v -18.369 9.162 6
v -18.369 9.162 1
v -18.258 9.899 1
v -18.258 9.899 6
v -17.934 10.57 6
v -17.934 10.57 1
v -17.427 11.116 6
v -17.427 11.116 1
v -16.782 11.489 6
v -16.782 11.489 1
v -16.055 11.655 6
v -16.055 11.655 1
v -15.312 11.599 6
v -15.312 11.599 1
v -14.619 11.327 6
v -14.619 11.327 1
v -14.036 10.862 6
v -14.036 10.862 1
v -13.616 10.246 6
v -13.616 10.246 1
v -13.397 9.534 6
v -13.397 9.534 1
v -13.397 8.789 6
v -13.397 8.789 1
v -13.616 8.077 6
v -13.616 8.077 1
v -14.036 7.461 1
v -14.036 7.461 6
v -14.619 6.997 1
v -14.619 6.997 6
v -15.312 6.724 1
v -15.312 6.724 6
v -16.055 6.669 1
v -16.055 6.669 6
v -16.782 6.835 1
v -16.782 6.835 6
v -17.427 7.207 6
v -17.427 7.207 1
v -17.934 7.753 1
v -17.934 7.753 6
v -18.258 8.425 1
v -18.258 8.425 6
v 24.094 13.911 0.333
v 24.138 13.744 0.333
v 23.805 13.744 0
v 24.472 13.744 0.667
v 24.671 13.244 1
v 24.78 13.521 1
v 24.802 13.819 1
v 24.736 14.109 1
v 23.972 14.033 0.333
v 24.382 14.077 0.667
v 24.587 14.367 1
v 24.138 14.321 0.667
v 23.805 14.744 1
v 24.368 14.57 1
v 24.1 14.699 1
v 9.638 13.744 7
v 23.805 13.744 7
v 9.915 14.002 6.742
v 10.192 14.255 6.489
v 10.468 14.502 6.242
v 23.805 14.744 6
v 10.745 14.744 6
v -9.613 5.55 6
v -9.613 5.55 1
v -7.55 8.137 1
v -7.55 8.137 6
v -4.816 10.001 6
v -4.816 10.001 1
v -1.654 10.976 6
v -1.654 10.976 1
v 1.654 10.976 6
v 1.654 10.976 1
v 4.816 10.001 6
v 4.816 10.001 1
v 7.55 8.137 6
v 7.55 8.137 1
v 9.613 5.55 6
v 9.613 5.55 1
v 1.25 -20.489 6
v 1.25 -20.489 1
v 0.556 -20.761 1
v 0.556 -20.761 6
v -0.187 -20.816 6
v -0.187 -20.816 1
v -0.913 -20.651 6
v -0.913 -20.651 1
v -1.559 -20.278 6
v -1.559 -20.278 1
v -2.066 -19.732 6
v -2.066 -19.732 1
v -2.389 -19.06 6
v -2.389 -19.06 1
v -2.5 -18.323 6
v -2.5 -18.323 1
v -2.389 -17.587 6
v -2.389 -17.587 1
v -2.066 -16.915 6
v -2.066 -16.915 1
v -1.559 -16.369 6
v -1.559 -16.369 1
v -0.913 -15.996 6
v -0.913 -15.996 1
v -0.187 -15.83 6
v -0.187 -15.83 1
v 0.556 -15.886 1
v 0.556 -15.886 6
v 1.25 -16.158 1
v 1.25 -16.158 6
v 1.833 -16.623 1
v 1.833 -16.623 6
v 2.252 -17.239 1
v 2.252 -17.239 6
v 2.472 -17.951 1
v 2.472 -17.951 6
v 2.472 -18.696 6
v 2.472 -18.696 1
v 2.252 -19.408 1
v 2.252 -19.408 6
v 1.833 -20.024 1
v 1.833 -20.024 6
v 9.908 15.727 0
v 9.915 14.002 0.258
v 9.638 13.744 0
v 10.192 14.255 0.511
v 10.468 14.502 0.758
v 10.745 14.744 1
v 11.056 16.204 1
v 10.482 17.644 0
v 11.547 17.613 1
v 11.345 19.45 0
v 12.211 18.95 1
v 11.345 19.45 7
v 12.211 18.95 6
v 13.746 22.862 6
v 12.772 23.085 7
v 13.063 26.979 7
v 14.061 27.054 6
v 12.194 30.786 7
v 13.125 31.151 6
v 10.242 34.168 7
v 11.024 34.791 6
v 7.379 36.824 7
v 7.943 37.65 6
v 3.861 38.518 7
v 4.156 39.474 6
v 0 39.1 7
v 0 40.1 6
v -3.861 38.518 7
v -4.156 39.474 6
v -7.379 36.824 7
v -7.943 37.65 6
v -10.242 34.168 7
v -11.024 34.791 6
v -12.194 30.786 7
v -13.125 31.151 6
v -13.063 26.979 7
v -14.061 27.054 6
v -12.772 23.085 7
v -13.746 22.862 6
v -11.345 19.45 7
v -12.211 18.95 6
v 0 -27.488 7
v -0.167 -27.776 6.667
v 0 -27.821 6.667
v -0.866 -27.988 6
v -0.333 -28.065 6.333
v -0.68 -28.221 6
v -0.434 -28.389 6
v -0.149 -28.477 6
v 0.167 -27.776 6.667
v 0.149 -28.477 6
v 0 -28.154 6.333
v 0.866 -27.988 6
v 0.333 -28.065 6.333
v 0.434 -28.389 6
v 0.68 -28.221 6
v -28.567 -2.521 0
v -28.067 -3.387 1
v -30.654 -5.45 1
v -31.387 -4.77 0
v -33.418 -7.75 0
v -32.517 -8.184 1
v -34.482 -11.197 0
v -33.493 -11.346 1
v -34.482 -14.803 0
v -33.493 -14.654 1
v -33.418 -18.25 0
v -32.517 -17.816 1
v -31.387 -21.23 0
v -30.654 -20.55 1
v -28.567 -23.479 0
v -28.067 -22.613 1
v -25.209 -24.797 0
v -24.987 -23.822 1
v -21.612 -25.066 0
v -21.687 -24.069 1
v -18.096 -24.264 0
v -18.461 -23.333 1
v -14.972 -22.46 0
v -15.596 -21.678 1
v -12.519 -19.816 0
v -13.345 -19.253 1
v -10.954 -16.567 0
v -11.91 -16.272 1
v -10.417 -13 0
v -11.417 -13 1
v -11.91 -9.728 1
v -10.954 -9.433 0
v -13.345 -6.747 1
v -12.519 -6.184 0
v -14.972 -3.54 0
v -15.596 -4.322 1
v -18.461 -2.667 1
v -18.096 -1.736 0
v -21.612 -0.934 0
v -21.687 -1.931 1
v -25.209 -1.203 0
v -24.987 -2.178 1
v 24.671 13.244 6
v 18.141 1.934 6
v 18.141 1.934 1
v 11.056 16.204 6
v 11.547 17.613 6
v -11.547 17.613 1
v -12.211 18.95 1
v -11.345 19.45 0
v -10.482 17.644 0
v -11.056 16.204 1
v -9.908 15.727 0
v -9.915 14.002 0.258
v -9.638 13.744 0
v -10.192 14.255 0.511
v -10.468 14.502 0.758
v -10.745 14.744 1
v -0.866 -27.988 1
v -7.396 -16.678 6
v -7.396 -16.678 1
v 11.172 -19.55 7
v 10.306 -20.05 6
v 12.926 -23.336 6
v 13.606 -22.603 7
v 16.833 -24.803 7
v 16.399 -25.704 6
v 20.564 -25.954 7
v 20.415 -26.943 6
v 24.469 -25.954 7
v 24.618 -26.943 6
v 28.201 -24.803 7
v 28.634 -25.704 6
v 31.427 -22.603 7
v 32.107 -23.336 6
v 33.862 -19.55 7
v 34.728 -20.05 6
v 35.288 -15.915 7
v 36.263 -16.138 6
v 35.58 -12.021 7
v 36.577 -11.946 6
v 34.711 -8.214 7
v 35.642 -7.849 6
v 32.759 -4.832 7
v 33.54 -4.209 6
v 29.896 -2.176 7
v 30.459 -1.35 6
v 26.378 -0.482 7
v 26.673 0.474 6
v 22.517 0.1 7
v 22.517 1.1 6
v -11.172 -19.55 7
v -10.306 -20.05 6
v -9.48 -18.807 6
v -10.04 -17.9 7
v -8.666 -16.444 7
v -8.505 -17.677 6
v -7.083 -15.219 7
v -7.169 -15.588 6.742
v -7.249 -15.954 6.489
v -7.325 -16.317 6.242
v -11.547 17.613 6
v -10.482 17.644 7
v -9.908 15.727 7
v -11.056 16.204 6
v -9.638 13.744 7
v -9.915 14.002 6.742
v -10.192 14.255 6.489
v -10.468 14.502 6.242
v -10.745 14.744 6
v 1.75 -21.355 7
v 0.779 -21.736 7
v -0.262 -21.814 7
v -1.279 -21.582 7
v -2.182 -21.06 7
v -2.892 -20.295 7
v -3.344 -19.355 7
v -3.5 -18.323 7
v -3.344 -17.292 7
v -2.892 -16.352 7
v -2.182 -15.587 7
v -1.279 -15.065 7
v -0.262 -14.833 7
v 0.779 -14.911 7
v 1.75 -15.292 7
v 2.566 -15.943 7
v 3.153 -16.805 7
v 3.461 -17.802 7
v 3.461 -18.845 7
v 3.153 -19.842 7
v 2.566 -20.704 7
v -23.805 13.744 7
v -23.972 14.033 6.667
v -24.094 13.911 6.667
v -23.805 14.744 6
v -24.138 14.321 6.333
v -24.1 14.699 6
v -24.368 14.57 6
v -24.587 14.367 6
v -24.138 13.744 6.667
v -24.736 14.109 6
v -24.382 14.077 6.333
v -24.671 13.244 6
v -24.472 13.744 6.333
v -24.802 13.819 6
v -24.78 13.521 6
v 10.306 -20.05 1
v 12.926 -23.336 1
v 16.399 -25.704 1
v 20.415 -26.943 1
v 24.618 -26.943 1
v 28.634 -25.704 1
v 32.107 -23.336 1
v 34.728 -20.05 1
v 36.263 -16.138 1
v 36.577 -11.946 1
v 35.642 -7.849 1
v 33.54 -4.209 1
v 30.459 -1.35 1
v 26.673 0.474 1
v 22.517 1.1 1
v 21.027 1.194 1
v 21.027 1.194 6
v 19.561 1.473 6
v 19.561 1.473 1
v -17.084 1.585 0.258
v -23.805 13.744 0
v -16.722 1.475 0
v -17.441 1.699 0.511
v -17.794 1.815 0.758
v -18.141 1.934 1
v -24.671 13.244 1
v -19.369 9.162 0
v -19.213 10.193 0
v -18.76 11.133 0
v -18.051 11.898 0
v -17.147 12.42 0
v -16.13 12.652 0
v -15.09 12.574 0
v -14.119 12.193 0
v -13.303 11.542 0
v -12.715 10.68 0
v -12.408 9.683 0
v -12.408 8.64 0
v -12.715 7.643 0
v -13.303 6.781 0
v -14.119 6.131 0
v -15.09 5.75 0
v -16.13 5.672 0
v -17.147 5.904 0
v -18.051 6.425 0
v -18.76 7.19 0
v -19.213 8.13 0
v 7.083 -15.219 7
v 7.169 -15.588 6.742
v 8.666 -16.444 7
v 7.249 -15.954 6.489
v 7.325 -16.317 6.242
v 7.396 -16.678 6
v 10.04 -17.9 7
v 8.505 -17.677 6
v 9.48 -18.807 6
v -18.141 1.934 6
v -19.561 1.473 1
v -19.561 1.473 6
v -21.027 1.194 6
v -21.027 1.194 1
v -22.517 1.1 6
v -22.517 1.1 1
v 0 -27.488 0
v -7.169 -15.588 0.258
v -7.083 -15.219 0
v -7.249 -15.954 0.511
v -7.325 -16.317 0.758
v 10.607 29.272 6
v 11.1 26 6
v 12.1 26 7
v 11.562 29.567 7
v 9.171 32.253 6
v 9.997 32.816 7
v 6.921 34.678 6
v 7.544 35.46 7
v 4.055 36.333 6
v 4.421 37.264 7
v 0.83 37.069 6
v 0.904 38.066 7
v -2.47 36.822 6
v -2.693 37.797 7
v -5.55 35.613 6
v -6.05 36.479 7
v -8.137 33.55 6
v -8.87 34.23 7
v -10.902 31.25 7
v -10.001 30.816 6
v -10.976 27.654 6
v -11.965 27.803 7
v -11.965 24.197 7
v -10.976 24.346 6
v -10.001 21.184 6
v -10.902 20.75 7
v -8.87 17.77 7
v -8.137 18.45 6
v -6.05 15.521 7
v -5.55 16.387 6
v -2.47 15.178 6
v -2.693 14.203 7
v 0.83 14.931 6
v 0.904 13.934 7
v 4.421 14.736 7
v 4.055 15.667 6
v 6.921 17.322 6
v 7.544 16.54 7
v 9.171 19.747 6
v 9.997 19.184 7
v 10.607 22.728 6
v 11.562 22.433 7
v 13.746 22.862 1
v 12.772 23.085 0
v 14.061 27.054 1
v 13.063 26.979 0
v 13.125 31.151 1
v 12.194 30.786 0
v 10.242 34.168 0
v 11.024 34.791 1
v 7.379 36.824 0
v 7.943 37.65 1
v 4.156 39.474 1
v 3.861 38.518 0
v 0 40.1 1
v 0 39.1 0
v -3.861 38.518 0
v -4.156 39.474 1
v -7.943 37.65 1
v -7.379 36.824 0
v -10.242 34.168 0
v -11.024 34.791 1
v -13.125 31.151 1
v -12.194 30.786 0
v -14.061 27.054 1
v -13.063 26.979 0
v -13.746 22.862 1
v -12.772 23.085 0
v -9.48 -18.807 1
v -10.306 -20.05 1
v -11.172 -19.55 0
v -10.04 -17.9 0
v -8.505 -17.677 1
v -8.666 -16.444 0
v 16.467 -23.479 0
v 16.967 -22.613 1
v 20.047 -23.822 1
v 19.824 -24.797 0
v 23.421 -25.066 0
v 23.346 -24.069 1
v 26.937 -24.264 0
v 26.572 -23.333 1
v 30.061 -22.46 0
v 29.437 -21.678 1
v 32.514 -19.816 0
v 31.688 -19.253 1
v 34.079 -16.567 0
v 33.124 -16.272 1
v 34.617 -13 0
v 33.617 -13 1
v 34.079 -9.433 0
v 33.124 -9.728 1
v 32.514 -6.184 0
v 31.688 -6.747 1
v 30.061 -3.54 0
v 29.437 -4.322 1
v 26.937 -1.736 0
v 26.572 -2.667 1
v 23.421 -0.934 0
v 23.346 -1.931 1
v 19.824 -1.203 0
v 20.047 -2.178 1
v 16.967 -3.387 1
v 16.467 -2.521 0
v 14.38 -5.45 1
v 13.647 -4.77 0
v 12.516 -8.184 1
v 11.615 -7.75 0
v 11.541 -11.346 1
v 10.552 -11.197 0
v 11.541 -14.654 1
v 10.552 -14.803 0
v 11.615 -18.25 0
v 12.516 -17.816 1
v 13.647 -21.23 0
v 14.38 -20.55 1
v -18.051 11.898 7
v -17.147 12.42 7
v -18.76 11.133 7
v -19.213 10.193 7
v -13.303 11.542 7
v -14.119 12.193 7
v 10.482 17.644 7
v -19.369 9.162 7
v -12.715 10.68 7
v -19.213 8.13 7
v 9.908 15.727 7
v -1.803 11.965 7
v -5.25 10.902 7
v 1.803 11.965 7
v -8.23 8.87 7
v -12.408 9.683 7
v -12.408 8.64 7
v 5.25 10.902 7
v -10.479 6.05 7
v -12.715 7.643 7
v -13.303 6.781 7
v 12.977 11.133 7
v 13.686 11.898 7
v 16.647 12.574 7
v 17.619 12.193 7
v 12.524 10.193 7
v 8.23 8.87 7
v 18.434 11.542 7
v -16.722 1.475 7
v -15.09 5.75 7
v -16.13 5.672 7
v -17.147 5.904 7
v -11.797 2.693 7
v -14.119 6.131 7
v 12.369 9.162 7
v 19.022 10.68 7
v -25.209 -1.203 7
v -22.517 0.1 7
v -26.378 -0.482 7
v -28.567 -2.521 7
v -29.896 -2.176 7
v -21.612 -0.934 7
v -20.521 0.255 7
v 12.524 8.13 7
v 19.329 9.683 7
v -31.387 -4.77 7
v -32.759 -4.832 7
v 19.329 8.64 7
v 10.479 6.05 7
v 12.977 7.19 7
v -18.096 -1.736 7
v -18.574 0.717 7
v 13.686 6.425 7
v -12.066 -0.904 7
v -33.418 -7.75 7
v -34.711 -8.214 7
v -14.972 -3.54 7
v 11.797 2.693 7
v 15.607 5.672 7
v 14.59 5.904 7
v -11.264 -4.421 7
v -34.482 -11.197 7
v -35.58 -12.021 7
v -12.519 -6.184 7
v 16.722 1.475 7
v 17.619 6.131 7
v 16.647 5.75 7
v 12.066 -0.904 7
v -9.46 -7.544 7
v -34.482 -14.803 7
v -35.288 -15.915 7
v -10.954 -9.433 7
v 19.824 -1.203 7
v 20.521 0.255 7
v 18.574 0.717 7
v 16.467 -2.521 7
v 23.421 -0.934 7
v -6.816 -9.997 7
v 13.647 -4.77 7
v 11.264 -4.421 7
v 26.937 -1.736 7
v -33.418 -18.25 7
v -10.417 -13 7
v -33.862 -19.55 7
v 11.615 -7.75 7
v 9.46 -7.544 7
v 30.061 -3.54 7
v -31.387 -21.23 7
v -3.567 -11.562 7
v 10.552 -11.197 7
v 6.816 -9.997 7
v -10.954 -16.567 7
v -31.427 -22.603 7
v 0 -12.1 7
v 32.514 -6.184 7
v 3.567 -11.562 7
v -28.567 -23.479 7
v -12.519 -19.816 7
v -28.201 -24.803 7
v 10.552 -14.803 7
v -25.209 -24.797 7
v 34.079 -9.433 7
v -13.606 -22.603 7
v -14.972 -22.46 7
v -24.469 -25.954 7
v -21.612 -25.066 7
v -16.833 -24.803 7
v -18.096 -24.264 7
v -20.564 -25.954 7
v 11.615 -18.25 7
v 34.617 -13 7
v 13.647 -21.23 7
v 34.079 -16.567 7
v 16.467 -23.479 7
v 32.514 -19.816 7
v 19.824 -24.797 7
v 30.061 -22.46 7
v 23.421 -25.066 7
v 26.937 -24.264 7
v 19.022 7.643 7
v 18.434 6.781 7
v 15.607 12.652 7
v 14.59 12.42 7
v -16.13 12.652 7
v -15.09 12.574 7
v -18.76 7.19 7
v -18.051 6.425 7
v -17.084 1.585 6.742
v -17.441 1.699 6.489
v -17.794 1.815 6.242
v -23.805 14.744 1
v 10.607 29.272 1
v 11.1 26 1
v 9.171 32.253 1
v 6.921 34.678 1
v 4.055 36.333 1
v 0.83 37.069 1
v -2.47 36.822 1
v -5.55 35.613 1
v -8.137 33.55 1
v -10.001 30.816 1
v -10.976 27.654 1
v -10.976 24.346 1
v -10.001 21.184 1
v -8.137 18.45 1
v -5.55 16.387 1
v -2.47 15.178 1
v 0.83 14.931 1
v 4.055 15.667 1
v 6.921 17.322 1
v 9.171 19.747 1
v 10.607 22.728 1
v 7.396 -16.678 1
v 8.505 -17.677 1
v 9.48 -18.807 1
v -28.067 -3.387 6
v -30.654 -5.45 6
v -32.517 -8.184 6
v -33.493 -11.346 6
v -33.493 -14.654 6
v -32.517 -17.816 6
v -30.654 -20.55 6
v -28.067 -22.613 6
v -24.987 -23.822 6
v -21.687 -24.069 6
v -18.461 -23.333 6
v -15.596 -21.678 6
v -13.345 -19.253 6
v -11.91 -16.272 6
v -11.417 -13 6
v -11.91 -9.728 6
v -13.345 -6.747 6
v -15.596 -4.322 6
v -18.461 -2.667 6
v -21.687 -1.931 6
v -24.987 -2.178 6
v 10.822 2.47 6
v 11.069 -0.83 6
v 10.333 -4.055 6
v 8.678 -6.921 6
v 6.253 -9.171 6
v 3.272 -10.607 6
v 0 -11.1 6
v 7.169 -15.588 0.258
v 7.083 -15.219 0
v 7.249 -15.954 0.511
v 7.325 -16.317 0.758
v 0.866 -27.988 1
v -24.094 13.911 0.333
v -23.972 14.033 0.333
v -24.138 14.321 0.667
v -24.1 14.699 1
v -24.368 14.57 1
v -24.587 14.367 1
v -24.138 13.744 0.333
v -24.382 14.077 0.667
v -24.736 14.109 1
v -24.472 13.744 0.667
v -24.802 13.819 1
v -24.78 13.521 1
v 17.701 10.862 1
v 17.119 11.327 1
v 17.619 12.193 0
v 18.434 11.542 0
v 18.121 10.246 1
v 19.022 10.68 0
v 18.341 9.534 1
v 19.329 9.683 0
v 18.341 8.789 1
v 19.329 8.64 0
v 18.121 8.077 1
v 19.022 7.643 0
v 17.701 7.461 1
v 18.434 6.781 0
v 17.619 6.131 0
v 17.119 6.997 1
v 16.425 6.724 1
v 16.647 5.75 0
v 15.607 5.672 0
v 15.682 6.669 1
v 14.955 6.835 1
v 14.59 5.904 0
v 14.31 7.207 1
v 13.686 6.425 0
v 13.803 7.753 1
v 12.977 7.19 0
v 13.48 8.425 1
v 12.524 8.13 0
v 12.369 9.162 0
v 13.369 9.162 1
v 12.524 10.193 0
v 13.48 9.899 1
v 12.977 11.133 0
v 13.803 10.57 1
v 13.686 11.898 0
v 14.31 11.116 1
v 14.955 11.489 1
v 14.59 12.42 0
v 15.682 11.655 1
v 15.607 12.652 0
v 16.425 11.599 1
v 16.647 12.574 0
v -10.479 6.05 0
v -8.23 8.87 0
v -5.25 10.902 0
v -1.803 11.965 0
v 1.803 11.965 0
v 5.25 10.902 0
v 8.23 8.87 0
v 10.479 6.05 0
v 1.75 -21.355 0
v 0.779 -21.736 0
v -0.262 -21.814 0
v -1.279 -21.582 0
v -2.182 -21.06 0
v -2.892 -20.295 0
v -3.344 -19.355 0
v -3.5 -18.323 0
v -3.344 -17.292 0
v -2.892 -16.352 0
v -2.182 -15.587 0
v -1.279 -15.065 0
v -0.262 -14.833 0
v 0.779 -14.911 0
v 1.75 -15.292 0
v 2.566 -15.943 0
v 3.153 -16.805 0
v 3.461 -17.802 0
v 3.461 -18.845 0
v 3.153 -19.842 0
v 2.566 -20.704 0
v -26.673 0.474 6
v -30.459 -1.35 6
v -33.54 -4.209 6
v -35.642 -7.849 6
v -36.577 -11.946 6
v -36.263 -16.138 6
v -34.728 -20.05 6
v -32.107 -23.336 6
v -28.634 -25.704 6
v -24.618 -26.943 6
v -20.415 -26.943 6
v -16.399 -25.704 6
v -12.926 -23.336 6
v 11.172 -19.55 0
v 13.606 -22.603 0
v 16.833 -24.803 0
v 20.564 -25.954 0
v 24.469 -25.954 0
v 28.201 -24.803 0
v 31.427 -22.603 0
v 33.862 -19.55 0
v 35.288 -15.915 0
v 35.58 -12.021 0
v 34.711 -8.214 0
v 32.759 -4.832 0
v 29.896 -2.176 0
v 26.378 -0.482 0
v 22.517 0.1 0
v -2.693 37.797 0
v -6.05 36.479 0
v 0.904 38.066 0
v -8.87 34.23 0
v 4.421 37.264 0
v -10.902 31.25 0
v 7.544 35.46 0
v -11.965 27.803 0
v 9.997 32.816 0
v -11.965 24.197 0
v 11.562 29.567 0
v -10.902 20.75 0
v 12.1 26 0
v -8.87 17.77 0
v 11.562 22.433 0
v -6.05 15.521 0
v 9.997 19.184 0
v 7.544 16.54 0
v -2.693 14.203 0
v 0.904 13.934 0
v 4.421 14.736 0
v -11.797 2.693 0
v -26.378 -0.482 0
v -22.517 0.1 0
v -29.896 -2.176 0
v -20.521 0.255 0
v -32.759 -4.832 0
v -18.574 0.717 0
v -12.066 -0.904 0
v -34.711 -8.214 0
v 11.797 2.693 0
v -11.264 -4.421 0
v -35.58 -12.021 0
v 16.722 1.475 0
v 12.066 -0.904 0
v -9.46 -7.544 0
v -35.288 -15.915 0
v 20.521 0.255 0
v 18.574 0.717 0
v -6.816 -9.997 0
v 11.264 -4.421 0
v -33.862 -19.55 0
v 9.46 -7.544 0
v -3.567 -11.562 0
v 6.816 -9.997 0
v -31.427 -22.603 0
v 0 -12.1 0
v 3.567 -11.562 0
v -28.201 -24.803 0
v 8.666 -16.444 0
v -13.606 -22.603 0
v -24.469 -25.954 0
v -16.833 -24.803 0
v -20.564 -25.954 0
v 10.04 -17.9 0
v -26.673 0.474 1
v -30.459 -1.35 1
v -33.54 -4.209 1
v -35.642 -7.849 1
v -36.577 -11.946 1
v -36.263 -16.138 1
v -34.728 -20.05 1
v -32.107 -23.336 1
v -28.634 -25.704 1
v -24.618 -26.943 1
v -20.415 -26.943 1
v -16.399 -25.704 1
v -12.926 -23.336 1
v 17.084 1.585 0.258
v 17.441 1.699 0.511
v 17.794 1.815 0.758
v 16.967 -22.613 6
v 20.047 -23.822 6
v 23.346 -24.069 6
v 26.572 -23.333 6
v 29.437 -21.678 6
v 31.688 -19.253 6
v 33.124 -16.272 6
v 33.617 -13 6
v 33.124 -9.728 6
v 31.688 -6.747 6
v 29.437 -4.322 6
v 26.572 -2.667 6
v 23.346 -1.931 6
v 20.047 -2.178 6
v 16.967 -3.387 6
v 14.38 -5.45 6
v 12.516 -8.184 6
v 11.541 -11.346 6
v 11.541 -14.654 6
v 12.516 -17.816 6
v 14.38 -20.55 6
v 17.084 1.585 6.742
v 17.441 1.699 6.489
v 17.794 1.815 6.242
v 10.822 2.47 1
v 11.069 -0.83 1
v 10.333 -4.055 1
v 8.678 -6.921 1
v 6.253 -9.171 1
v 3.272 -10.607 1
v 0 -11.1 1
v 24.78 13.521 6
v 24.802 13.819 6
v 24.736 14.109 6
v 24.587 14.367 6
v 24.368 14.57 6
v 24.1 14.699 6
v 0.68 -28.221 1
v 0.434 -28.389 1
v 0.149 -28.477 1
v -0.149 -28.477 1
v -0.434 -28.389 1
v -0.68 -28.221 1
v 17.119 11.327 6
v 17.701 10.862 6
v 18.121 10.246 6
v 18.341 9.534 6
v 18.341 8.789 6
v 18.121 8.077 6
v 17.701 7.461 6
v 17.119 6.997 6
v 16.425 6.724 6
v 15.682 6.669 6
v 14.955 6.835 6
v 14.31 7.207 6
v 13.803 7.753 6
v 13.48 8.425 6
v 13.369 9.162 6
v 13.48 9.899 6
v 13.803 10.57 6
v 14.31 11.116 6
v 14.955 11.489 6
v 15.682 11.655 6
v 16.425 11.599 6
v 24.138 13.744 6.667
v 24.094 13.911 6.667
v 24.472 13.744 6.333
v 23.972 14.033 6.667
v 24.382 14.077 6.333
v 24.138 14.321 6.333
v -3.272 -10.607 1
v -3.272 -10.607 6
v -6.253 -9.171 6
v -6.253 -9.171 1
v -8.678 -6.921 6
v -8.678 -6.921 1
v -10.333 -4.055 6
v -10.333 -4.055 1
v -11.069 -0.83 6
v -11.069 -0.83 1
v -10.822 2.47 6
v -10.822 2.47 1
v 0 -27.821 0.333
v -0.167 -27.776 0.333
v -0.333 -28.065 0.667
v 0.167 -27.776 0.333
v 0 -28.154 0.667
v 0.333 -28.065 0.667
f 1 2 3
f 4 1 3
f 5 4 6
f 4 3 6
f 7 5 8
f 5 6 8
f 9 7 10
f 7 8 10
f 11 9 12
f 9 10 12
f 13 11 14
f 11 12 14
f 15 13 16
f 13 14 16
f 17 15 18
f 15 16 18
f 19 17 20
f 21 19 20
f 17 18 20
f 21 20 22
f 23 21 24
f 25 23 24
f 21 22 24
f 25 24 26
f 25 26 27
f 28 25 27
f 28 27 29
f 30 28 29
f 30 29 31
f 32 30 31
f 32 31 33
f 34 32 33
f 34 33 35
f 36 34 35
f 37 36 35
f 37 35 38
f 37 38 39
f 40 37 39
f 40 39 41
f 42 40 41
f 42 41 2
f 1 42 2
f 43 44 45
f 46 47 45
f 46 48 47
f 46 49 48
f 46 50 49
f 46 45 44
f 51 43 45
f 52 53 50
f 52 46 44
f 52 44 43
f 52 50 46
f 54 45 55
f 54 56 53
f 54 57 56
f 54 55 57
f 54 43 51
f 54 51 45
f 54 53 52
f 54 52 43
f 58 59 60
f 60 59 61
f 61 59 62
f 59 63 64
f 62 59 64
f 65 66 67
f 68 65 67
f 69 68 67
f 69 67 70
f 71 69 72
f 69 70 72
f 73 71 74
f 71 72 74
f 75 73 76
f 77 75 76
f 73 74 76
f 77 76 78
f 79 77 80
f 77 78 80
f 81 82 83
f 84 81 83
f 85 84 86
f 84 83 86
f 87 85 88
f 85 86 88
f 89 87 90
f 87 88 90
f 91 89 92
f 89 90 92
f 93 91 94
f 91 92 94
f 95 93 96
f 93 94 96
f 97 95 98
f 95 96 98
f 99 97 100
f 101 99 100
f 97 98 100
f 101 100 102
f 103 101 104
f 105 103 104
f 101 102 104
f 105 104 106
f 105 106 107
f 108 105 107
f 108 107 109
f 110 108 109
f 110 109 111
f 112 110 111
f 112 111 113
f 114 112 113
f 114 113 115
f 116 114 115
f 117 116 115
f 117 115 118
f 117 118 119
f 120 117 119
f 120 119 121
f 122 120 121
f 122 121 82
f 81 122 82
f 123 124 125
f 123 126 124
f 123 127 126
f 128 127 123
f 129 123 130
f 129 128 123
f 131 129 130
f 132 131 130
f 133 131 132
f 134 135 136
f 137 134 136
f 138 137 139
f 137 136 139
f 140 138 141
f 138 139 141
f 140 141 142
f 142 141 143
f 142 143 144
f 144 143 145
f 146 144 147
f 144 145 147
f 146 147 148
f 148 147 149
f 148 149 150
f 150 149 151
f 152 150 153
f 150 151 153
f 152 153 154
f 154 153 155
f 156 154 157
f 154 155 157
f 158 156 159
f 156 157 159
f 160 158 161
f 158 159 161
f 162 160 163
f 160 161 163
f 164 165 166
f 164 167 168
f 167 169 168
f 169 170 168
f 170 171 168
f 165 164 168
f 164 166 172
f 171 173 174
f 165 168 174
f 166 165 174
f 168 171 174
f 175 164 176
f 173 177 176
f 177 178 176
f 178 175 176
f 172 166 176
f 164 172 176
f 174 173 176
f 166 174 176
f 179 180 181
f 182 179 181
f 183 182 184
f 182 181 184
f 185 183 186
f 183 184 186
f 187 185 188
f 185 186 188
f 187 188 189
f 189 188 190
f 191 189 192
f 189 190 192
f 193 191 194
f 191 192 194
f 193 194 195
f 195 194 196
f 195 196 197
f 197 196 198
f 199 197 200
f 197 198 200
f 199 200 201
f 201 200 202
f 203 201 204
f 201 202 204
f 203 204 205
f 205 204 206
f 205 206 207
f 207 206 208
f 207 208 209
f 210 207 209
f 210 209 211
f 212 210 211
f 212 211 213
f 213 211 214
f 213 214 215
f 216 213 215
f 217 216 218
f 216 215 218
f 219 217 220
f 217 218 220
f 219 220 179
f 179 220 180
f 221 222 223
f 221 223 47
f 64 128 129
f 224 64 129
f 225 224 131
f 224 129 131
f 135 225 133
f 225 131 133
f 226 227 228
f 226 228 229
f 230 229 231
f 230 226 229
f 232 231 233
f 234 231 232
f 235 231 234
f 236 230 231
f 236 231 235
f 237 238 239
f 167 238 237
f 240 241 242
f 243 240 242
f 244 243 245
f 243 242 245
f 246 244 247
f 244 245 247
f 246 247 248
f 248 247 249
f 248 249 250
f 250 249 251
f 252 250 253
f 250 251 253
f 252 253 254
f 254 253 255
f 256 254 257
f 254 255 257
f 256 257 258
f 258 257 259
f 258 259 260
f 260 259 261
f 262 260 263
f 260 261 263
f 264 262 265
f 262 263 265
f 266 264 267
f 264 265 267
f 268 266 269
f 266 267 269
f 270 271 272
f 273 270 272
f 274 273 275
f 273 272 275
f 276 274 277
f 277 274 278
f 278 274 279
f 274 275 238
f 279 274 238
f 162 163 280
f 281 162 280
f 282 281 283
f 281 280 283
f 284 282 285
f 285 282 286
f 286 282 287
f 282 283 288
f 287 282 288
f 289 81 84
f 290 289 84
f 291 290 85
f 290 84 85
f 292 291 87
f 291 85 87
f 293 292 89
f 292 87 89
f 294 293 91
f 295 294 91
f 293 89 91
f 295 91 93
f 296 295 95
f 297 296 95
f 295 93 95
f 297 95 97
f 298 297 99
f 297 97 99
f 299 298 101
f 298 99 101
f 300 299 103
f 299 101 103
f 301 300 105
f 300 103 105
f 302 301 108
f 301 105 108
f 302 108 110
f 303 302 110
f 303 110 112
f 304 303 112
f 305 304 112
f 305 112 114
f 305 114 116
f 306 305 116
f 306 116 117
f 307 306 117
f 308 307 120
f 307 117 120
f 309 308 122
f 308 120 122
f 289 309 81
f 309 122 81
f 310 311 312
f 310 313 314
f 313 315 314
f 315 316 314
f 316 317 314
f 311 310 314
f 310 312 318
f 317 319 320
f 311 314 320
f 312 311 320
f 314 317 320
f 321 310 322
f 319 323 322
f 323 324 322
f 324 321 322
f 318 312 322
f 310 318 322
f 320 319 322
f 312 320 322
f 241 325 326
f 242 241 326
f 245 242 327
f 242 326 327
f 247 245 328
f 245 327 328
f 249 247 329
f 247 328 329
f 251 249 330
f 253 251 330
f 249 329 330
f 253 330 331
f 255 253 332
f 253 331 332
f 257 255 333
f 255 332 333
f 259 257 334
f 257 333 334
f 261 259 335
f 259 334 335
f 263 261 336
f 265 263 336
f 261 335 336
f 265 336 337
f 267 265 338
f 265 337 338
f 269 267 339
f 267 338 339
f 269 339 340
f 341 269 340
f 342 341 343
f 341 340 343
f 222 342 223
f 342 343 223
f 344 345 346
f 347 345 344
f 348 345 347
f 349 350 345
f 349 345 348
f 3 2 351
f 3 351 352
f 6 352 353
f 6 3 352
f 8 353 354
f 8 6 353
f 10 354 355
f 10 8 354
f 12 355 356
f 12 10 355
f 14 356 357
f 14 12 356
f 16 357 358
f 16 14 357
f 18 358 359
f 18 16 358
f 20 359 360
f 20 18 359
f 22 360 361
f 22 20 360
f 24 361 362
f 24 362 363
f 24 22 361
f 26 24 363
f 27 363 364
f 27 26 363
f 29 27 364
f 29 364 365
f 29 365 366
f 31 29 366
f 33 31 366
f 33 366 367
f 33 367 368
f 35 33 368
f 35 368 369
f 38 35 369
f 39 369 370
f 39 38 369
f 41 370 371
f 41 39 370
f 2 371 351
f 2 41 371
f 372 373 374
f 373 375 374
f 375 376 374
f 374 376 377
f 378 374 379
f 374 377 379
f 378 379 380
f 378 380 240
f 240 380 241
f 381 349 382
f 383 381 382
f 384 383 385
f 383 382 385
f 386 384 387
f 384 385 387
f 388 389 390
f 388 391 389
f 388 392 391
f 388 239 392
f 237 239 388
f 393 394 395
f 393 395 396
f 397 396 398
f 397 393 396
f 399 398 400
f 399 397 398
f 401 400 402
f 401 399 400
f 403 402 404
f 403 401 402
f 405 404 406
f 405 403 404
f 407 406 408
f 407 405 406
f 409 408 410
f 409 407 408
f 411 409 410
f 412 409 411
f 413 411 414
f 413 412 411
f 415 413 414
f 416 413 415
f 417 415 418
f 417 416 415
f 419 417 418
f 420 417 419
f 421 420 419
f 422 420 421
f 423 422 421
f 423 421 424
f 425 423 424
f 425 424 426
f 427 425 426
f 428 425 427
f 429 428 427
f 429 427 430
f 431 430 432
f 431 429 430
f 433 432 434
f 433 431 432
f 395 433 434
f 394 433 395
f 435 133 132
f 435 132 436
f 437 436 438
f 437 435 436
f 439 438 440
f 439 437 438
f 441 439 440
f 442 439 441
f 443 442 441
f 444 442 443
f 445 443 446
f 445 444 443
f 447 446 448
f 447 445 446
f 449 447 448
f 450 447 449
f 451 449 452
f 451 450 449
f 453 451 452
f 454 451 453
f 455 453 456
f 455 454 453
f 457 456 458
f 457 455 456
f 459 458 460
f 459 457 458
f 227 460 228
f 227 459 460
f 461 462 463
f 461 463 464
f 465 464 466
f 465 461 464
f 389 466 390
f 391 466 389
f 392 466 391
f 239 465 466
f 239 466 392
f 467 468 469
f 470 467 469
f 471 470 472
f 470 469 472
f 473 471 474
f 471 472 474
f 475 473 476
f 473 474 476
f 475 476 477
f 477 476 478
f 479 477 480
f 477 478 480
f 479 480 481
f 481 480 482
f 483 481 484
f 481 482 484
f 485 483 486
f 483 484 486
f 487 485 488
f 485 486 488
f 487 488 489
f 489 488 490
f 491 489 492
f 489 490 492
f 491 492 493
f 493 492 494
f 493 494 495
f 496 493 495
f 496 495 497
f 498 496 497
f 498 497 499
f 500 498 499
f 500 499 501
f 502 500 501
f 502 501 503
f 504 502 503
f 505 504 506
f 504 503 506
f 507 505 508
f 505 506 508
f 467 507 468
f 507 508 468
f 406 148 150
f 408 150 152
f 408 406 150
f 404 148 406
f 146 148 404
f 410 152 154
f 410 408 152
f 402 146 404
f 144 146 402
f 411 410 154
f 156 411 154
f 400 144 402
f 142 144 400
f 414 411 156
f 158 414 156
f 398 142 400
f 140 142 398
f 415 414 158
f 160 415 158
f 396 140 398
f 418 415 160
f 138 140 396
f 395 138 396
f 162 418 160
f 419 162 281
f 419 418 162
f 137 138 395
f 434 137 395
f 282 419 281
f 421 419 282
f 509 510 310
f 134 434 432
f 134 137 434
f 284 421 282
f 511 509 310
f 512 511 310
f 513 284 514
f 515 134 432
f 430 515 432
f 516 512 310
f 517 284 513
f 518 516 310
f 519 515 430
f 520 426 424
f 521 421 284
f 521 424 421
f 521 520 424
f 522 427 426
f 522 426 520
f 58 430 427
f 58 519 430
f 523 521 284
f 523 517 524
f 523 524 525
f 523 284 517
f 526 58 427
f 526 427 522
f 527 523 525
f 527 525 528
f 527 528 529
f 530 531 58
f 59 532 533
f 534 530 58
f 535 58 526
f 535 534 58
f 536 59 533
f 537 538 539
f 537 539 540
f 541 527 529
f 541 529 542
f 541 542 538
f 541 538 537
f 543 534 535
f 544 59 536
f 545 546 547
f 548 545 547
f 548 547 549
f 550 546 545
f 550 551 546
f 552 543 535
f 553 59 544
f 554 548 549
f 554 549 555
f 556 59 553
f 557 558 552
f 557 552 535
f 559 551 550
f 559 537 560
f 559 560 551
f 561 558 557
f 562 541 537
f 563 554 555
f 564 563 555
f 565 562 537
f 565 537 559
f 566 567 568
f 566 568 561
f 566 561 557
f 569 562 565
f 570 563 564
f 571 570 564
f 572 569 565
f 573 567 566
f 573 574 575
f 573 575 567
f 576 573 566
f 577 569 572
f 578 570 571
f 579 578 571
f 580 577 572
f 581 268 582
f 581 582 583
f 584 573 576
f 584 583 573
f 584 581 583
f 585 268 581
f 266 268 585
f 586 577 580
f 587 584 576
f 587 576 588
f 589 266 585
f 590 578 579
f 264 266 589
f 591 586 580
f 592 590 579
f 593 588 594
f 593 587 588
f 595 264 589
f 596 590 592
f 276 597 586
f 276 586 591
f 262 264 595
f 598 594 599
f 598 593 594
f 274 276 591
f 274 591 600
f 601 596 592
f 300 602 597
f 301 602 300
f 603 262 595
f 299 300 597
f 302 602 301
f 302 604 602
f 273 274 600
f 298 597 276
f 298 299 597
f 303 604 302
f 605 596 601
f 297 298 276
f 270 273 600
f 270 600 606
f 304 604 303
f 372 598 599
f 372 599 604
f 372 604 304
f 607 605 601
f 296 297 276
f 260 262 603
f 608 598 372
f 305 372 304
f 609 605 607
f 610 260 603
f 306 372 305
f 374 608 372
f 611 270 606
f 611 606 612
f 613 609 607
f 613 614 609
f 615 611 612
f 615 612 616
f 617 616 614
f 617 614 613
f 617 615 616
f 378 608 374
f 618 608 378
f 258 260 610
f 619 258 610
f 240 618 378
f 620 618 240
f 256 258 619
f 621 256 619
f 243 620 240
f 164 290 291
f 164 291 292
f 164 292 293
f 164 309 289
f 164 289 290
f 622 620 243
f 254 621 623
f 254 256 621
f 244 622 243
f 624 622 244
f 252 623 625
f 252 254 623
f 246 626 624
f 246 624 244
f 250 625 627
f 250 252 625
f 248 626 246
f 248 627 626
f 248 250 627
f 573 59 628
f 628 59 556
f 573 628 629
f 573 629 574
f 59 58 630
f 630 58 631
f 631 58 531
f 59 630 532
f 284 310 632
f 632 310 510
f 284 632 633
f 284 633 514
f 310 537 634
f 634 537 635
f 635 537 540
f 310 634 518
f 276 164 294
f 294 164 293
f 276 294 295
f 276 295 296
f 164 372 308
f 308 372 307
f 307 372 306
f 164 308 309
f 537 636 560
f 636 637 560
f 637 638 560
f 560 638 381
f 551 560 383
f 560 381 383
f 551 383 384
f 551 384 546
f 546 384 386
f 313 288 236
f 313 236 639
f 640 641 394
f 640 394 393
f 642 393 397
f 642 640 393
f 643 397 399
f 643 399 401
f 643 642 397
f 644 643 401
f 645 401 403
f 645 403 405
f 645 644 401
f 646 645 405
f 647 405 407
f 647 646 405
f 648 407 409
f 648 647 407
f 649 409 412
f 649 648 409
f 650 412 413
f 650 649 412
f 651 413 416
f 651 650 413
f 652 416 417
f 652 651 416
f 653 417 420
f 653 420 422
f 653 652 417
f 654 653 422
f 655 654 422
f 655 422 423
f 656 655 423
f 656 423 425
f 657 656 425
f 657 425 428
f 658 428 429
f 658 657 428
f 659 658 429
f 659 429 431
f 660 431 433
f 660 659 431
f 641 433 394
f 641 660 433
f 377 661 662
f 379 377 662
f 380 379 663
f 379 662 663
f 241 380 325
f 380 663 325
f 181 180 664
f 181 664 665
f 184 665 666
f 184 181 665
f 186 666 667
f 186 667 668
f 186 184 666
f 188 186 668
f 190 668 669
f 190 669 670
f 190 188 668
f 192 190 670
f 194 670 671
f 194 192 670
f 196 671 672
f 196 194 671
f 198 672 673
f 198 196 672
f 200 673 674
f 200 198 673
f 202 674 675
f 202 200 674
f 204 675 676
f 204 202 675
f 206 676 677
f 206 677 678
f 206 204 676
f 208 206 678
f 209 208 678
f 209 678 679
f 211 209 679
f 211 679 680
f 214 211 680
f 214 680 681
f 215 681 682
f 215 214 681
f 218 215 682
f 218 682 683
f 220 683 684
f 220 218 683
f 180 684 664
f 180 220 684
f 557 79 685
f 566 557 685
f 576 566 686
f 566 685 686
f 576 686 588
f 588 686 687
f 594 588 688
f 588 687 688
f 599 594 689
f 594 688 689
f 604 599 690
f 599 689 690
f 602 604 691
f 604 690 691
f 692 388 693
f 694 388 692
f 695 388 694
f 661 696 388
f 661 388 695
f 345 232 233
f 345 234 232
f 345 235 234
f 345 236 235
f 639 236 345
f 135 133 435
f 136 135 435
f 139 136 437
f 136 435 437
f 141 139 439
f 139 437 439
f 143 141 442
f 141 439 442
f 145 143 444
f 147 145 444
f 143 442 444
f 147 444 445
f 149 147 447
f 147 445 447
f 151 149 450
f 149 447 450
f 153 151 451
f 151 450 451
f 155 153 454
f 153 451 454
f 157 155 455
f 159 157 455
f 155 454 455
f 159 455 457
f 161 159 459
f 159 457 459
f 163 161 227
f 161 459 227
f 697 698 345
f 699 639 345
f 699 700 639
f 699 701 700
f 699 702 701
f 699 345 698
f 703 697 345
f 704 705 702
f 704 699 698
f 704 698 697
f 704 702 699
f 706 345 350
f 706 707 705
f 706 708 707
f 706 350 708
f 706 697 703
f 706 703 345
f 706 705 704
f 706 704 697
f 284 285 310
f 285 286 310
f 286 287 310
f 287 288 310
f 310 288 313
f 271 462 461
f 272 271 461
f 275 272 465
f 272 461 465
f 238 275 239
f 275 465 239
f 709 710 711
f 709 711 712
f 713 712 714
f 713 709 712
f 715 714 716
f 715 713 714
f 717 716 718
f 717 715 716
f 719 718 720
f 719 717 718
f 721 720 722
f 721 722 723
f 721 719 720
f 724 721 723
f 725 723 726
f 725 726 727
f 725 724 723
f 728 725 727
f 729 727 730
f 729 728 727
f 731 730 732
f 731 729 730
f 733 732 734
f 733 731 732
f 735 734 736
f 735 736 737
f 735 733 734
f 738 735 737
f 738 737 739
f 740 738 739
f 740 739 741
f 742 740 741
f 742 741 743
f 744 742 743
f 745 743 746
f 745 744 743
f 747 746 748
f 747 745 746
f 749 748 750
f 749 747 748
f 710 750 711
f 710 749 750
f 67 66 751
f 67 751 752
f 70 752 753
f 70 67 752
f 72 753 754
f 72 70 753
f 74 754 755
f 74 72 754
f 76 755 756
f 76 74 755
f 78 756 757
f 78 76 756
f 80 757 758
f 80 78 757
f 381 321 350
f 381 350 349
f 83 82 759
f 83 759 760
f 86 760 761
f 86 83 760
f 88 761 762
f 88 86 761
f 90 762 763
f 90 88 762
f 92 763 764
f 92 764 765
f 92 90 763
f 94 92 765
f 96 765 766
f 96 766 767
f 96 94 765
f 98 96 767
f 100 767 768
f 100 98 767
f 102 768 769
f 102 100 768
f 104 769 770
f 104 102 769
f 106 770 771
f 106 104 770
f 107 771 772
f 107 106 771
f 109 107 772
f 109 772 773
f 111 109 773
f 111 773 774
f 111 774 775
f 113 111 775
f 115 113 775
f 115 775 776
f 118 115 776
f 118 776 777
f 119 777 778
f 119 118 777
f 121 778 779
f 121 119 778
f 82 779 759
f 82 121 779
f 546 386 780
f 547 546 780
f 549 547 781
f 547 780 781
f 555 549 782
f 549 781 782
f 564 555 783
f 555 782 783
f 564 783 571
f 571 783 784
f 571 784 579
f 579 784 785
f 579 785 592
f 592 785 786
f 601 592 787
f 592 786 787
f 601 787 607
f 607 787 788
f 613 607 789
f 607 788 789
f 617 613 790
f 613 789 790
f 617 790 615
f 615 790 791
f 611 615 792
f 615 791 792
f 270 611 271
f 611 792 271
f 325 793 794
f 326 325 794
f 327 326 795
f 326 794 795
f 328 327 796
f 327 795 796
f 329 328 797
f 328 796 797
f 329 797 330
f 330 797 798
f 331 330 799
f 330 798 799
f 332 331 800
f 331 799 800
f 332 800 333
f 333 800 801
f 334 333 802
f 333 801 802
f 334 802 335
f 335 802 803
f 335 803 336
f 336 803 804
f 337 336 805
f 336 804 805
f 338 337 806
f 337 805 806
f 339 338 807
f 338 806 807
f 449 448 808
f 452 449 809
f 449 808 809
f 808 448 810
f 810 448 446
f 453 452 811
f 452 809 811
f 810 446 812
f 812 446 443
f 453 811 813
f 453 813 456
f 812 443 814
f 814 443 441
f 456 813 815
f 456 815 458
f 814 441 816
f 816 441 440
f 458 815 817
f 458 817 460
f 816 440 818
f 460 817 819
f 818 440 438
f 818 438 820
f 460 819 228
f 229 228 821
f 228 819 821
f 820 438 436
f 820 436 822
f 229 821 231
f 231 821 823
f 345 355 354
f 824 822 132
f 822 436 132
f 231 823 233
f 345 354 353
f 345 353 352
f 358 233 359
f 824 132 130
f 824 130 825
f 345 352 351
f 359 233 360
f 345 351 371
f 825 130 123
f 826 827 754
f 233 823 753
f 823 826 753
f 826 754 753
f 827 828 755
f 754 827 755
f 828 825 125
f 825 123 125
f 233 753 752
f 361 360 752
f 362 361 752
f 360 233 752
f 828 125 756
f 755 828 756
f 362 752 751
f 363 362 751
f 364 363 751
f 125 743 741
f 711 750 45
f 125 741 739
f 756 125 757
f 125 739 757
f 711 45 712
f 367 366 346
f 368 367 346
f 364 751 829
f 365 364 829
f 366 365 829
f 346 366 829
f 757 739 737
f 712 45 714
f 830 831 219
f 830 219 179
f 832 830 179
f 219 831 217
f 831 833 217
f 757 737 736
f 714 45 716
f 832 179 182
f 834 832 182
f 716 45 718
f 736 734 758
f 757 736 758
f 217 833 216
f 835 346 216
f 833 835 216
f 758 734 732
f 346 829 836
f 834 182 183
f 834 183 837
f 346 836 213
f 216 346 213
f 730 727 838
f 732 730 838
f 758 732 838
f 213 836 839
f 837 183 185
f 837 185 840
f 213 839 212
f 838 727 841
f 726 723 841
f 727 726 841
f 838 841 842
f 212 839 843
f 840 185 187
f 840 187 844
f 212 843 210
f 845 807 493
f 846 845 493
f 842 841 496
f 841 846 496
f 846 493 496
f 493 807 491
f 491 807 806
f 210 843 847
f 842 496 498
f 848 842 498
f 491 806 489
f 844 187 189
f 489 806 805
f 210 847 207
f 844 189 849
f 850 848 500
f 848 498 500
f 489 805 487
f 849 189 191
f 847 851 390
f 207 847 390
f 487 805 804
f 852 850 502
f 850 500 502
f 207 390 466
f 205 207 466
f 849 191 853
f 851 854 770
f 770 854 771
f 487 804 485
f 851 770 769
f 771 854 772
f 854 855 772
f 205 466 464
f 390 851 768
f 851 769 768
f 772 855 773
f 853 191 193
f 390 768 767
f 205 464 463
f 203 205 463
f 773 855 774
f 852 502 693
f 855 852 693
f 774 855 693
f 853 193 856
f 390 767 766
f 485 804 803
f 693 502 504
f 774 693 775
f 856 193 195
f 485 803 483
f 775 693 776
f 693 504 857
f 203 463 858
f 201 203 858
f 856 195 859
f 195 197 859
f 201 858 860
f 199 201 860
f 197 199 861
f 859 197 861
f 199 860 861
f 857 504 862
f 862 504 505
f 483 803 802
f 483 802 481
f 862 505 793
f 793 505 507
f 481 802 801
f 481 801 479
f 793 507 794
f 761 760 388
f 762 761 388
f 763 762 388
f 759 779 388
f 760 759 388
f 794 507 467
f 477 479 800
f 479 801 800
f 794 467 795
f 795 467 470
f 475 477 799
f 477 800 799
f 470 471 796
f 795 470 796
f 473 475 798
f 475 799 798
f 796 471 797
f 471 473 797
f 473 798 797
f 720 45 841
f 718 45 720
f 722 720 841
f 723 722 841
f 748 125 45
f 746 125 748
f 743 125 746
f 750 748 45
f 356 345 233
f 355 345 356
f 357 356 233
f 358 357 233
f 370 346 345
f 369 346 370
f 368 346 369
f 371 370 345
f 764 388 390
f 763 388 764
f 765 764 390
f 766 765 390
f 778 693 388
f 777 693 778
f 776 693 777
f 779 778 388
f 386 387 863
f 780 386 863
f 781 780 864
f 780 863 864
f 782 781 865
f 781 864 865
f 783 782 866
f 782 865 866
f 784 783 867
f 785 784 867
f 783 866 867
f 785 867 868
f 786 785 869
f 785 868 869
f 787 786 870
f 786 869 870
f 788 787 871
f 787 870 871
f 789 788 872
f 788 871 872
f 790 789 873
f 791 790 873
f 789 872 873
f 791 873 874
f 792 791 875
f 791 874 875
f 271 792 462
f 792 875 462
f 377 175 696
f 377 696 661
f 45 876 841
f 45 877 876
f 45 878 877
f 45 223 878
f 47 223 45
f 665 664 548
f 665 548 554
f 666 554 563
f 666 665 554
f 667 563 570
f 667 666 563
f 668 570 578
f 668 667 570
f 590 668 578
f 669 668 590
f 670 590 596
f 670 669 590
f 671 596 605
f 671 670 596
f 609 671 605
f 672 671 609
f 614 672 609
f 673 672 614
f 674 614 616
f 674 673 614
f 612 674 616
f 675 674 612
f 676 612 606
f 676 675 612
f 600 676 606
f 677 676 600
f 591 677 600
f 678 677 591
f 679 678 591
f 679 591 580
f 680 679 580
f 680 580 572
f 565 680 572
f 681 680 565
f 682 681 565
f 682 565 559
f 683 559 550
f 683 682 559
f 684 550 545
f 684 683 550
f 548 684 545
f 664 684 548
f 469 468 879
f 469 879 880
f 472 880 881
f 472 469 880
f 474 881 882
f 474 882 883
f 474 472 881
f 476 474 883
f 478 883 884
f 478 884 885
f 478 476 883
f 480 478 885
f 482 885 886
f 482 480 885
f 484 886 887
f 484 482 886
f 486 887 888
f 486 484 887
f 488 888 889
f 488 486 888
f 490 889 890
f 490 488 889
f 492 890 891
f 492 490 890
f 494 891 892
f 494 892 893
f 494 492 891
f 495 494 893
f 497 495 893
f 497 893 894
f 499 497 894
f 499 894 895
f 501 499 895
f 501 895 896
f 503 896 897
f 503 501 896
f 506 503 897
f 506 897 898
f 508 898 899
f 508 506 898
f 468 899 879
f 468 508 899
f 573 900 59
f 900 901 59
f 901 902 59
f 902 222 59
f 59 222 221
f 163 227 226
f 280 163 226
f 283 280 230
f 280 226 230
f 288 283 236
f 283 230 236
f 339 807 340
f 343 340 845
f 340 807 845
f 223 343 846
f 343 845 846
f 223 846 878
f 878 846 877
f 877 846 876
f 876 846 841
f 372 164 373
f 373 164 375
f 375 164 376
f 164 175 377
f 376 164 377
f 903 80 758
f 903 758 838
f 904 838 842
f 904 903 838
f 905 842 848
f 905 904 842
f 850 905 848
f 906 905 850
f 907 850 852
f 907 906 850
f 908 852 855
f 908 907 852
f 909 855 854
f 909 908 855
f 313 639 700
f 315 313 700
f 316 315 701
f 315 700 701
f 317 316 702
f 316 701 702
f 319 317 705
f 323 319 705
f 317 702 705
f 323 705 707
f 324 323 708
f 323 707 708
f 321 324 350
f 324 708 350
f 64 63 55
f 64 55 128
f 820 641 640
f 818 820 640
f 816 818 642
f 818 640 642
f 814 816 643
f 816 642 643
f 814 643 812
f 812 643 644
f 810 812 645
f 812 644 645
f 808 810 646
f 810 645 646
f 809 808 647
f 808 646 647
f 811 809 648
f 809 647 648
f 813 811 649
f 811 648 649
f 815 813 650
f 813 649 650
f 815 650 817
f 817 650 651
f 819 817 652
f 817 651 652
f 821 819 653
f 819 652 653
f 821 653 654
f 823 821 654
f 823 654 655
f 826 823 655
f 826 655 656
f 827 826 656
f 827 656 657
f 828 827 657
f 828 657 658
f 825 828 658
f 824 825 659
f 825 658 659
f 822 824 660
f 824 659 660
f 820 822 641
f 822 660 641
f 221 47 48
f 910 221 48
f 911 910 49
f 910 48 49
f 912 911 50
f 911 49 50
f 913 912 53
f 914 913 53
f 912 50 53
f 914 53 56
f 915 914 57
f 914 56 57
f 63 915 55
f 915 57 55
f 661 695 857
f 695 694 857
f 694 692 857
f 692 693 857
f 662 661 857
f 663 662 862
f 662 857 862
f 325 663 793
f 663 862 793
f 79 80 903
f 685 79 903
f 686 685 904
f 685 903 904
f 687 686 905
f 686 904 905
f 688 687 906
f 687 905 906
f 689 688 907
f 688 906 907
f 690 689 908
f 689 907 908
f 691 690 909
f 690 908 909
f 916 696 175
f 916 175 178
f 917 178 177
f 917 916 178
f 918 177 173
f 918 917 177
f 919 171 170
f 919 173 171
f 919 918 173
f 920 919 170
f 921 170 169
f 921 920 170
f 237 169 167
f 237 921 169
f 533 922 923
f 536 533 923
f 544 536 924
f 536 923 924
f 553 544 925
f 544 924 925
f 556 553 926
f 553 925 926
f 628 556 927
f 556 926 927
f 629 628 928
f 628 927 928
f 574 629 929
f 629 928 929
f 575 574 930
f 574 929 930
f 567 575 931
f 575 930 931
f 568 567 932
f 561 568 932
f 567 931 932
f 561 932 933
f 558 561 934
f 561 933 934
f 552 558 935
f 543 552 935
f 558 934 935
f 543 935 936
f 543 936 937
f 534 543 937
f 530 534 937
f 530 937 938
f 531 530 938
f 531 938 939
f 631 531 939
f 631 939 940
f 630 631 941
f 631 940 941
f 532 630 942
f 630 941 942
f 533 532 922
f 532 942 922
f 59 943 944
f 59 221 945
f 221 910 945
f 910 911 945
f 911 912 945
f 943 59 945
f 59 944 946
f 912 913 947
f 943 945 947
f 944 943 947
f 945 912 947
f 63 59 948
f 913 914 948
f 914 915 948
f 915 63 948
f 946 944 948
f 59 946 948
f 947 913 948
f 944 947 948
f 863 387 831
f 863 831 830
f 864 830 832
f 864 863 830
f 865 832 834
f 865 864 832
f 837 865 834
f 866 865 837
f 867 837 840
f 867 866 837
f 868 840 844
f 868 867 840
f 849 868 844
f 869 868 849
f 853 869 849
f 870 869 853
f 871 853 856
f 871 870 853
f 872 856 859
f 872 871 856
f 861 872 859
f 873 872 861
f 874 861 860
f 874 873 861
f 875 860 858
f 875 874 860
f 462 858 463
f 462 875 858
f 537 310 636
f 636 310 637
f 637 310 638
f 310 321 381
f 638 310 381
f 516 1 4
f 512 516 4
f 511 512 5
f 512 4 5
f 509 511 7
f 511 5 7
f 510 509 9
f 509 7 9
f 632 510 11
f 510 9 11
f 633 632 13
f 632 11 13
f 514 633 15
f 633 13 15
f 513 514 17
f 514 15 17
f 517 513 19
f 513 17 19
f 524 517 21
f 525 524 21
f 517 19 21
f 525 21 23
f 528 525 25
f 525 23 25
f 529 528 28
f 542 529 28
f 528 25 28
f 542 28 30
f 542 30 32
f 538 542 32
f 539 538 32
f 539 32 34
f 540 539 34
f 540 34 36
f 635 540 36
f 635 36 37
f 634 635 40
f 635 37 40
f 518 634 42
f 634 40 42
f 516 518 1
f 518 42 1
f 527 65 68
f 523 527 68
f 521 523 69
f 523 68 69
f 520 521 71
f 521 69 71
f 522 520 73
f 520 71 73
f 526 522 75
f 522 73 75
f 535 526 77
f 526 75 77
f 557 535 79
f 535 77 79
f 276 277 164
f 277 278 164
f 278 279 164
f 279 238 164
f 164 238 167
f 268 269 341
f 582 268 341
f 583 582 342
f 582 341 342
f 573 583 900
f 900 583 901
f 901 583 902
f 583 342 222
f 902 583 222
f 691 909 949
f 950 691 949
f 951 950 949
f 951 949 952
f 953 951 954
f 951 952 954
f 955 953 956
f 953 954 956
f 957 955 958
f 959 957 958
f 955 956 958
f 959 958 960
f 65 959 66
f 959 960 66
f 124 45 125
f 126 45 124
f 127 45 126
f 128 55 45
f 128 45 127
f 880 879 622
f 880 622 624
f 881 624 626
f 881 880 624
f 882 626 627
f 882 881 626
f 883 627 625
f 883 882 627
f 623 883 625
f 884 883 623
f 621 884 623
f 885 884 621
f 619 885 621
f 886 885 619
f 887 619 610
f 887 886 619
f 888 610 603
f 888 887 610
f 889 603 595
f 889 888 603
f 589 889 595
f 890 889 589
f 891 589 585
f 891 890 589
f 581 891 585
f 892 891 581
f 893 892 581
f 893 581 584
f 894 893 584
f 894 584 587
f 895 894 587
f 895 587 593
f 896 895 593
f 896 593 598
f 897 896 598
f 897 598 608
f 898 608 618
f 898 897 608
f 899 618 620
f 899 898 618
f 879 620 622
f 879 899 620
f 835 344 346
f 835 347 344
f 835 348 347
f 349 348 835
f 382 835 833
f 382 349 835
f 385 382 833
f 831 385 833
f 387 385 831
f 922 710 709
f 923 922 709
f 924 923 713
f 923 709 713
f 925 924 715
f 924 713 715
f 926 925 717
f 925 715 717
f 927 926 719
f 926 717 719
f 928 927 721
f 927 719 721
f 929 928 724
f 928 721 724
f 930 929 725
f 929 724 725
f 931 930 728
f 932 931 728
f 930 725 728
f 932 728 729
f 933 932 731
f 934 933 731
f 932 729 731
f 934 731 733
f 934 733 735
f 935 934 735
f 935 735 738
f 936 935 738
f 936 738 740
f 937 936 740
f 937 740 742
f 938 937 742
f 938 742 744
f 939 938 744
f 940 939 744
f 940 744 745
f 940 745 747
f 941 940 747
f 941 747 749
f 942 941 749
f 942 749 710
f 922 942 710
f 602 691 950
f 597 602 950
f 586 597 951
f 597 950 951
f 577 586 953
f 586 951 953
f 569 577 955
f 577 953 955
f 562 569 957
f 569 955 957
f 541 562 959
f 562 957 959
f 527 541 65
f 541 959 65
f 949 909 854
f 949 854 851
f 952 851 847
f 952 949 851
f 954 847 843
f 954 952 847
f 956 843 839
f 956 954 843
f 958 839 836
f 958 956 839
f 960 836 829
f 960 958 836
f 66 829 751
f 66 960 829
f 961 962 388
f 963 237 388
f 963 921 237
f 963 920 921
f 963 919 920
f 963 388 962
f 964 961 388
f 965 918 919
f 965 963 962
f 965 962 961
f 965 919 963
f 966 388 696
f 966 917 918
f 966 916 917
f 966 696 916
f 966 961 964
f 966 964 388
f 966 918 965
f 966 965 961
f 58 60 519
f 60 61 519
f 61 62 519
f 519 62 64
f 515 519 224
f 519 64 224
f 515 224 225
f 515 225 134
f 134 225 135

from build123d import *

# Parameters (mm, degrees)
F0_R            = 11.1
F1_DEPTH        = 7
F2_COUNT        = 3
F5_DEPTH        = 7
F5_COPIES_COUNT = 3
F6_D            = 5
F6_COPIES_COUNT = 3
F7_R            = 1
F8_SIZE         = 0.99999


# Not quite as in the source:
# - a fillet or chamfer is up to 0.001 mm smaller than in the source, because OpenCascade refuses the exact size
# - a pattern or mirror of a feature is missing from the dataset's text; its kind, count and spacing are read off the source's solid


with BuildPart() as f1:
    # F0 (on Top) → F1 (new body)
    with BuildSketch(Plane.XY):
        with BuildLine():
            ThreePointArc((-9.612881982, 5.55), (0, 11.1), (9.612881982, 5.55))
            Line((9.612881982, 5.55), (11.2583302492, 6.5))
            Line((11.2583302492, 6.5), (12.2109581934, 7.05))
            ThreePointArc((12.2109581934, 7.05), (10.6166604984, 13), (12.2109581934, 18.95))
            ThreePointArc((12.2109581934, 18.95), (0, 40.1), (-12.2109581934, 18.95))
            ThreePointArc((-12.2109581934, 18.95), (-10.6166604984, 13), (-12.2109581934, 7.05))
            Line((-12.2109581934, 7.05), (-11.2583302492, 6.5))
            Line((-11.2583302492, 6.5), (-9.612881982, 5.55))
        make_face()
        with Locations((0, 26)):
            Circle(F0_R, mode=Mode.SUBTRACT)
    extrude(amount=F1_DEPTH)

    # F2: F1 ×3 about axis
    f2_axis = Axis((0, 0, 0), (0, 0, 1))


with BuildPart() as f1_1:
    add(f1.part)
    for i in range(1, F2_COUNT):
        add(f1.part.rotate(f2_axis, i * 360 / F2_COUNT))

    # F4 (on face) → F5 (join)
    with BuildSketch(Plane.XY.offset(7)):
        with BuildLine():
            ThreePointArc((-18.1411493779, 1.9336138494), (-12.2109581934, 7.05), (-10.7451334036, 14.7438892904))
            Line((-10.7451334036, 14.7438892904), (-25.5371653521, 14.7438892904))
            Line((-25.5371653521, 14.7438892904), (-18.1411493779, 1.9336138494))
        make_face()
    f5 = extrude(amount=-F5_DEPTH)

    # F5_copies: F5 ×3 about axis
    f5_copies_axis = Axis((0, 0, 0), (0, 0, 1))
    for i in range(1, F5_COPIES_COUNT):
        add(f5.rotate(f5_copies_axis, i * 360 / F5_COPIES_COUNT))

    # F6 (through all)
    with Locations(Plane.XY.offset(7)):
        with Locations((-15.8686004579, 9.161740746)):
            f6 = Hole(F6_D / 2)

    # F6_copies: F6 ×3 about axis
    f6_copies_axis = Axis((0, 0, 0), (0, 0, 1))
    for i in range(1, F6_COPIES_COUNT):
        add(f6.rotate(f6_copies_axis, i * 360 / F6_COPIES_COUNT), mode=Mode.SUBTRACT)

    # F7
    f7_edges = [f1_1.edges().sort_by_distance(p)[0] for p in [
        (-25.537165, 14.743889, 3.5),
        (25.537165, 14.743889, 3.5),
        (0, -29.487779, 3.5),
    ]]
    fillet(f7_edges, radius=F7_R)

    # F8 (size 1 in the source; OpenCascade refuses exactly that, so slightly less here)
    f8_edges = [f1_1.edges().sort_by_distance(p)[0] for p in [
        (17.275124, 14.743889, 0),
        (24.67114, 14.243889, 0),
        (11.279496, 16.916139, 0),
        (21.406145, 7.588752, 0),
        (0, 40.1, 0),
        (20.289554, 1.310261, 0),
        (-11.279496, 16.916139, 0),
        (34.727619, -20.05, 0),
        (-17.275124, 14.743889, 0),
        (9.010058, -18.2264, 0),
        (-24.67114, 14.243889, 0),
        (4.131021, -22.332641, 0),
        (-21.406145, 7.588752, 0),
        (0, -28.487779, 0),
        (-20.289554, 1.310261, 0),
        (-4.131021, -22.332641, 0),
        (-34.727619, -20.05, 0),
        (-9.010058, -18.2264, 0),
        (-16.96666, -22.612882, 0),
        (1.25, -20.488545, 0),
        (28.06666, -3.387118, 0),
        (-9.612882, -5.55, 0),
        (-18.3686, 9.161741, 0),
        (17.1186, 11.326804, 0),
        (-11.1, 26, 0),
        (17.275124, 14.743889, 7),
        (24.67114, 14.243889, 7),
        (11.279496, 16.916139, 7),
        (21.406145, 7.588752, 7),
        (0, 40.1, 7),
        (20.289554, 1.310261, 7),
        (-11.279496, 16.916139, 7),
        (34.727619, -20.05, 7),
        (-17.275124, 14.743889, 7),
        (9.010058, -18.2264, 7),
        (-24.67114, 14.243889, 7),
        (4.131021, -22.332641, 7),
        (-21.406145, 7.588752, 7),
        (0, -28.487779, 7),
        (-20.289554, 1.310261, 7),
        (-4.131021, -22.332641, 7),
        (-34.727619, -20.05, 7),
        (-9.010058, -18.2264, 7),
        (-16.96666, -22.612882, 7),
        (1.25, -20.488545, 7),
        (28.06666, -3.387118, 7),
        (-9.612882, -5.55, 7),
        (-18.3686, 9.161741, 7),
        (17.1186, 11.326804, 7),
        (-11.1, 26, 7),
    ]]
    chamfer(f8_edges, length=F8_SIZE)


solid = f1_1.part
